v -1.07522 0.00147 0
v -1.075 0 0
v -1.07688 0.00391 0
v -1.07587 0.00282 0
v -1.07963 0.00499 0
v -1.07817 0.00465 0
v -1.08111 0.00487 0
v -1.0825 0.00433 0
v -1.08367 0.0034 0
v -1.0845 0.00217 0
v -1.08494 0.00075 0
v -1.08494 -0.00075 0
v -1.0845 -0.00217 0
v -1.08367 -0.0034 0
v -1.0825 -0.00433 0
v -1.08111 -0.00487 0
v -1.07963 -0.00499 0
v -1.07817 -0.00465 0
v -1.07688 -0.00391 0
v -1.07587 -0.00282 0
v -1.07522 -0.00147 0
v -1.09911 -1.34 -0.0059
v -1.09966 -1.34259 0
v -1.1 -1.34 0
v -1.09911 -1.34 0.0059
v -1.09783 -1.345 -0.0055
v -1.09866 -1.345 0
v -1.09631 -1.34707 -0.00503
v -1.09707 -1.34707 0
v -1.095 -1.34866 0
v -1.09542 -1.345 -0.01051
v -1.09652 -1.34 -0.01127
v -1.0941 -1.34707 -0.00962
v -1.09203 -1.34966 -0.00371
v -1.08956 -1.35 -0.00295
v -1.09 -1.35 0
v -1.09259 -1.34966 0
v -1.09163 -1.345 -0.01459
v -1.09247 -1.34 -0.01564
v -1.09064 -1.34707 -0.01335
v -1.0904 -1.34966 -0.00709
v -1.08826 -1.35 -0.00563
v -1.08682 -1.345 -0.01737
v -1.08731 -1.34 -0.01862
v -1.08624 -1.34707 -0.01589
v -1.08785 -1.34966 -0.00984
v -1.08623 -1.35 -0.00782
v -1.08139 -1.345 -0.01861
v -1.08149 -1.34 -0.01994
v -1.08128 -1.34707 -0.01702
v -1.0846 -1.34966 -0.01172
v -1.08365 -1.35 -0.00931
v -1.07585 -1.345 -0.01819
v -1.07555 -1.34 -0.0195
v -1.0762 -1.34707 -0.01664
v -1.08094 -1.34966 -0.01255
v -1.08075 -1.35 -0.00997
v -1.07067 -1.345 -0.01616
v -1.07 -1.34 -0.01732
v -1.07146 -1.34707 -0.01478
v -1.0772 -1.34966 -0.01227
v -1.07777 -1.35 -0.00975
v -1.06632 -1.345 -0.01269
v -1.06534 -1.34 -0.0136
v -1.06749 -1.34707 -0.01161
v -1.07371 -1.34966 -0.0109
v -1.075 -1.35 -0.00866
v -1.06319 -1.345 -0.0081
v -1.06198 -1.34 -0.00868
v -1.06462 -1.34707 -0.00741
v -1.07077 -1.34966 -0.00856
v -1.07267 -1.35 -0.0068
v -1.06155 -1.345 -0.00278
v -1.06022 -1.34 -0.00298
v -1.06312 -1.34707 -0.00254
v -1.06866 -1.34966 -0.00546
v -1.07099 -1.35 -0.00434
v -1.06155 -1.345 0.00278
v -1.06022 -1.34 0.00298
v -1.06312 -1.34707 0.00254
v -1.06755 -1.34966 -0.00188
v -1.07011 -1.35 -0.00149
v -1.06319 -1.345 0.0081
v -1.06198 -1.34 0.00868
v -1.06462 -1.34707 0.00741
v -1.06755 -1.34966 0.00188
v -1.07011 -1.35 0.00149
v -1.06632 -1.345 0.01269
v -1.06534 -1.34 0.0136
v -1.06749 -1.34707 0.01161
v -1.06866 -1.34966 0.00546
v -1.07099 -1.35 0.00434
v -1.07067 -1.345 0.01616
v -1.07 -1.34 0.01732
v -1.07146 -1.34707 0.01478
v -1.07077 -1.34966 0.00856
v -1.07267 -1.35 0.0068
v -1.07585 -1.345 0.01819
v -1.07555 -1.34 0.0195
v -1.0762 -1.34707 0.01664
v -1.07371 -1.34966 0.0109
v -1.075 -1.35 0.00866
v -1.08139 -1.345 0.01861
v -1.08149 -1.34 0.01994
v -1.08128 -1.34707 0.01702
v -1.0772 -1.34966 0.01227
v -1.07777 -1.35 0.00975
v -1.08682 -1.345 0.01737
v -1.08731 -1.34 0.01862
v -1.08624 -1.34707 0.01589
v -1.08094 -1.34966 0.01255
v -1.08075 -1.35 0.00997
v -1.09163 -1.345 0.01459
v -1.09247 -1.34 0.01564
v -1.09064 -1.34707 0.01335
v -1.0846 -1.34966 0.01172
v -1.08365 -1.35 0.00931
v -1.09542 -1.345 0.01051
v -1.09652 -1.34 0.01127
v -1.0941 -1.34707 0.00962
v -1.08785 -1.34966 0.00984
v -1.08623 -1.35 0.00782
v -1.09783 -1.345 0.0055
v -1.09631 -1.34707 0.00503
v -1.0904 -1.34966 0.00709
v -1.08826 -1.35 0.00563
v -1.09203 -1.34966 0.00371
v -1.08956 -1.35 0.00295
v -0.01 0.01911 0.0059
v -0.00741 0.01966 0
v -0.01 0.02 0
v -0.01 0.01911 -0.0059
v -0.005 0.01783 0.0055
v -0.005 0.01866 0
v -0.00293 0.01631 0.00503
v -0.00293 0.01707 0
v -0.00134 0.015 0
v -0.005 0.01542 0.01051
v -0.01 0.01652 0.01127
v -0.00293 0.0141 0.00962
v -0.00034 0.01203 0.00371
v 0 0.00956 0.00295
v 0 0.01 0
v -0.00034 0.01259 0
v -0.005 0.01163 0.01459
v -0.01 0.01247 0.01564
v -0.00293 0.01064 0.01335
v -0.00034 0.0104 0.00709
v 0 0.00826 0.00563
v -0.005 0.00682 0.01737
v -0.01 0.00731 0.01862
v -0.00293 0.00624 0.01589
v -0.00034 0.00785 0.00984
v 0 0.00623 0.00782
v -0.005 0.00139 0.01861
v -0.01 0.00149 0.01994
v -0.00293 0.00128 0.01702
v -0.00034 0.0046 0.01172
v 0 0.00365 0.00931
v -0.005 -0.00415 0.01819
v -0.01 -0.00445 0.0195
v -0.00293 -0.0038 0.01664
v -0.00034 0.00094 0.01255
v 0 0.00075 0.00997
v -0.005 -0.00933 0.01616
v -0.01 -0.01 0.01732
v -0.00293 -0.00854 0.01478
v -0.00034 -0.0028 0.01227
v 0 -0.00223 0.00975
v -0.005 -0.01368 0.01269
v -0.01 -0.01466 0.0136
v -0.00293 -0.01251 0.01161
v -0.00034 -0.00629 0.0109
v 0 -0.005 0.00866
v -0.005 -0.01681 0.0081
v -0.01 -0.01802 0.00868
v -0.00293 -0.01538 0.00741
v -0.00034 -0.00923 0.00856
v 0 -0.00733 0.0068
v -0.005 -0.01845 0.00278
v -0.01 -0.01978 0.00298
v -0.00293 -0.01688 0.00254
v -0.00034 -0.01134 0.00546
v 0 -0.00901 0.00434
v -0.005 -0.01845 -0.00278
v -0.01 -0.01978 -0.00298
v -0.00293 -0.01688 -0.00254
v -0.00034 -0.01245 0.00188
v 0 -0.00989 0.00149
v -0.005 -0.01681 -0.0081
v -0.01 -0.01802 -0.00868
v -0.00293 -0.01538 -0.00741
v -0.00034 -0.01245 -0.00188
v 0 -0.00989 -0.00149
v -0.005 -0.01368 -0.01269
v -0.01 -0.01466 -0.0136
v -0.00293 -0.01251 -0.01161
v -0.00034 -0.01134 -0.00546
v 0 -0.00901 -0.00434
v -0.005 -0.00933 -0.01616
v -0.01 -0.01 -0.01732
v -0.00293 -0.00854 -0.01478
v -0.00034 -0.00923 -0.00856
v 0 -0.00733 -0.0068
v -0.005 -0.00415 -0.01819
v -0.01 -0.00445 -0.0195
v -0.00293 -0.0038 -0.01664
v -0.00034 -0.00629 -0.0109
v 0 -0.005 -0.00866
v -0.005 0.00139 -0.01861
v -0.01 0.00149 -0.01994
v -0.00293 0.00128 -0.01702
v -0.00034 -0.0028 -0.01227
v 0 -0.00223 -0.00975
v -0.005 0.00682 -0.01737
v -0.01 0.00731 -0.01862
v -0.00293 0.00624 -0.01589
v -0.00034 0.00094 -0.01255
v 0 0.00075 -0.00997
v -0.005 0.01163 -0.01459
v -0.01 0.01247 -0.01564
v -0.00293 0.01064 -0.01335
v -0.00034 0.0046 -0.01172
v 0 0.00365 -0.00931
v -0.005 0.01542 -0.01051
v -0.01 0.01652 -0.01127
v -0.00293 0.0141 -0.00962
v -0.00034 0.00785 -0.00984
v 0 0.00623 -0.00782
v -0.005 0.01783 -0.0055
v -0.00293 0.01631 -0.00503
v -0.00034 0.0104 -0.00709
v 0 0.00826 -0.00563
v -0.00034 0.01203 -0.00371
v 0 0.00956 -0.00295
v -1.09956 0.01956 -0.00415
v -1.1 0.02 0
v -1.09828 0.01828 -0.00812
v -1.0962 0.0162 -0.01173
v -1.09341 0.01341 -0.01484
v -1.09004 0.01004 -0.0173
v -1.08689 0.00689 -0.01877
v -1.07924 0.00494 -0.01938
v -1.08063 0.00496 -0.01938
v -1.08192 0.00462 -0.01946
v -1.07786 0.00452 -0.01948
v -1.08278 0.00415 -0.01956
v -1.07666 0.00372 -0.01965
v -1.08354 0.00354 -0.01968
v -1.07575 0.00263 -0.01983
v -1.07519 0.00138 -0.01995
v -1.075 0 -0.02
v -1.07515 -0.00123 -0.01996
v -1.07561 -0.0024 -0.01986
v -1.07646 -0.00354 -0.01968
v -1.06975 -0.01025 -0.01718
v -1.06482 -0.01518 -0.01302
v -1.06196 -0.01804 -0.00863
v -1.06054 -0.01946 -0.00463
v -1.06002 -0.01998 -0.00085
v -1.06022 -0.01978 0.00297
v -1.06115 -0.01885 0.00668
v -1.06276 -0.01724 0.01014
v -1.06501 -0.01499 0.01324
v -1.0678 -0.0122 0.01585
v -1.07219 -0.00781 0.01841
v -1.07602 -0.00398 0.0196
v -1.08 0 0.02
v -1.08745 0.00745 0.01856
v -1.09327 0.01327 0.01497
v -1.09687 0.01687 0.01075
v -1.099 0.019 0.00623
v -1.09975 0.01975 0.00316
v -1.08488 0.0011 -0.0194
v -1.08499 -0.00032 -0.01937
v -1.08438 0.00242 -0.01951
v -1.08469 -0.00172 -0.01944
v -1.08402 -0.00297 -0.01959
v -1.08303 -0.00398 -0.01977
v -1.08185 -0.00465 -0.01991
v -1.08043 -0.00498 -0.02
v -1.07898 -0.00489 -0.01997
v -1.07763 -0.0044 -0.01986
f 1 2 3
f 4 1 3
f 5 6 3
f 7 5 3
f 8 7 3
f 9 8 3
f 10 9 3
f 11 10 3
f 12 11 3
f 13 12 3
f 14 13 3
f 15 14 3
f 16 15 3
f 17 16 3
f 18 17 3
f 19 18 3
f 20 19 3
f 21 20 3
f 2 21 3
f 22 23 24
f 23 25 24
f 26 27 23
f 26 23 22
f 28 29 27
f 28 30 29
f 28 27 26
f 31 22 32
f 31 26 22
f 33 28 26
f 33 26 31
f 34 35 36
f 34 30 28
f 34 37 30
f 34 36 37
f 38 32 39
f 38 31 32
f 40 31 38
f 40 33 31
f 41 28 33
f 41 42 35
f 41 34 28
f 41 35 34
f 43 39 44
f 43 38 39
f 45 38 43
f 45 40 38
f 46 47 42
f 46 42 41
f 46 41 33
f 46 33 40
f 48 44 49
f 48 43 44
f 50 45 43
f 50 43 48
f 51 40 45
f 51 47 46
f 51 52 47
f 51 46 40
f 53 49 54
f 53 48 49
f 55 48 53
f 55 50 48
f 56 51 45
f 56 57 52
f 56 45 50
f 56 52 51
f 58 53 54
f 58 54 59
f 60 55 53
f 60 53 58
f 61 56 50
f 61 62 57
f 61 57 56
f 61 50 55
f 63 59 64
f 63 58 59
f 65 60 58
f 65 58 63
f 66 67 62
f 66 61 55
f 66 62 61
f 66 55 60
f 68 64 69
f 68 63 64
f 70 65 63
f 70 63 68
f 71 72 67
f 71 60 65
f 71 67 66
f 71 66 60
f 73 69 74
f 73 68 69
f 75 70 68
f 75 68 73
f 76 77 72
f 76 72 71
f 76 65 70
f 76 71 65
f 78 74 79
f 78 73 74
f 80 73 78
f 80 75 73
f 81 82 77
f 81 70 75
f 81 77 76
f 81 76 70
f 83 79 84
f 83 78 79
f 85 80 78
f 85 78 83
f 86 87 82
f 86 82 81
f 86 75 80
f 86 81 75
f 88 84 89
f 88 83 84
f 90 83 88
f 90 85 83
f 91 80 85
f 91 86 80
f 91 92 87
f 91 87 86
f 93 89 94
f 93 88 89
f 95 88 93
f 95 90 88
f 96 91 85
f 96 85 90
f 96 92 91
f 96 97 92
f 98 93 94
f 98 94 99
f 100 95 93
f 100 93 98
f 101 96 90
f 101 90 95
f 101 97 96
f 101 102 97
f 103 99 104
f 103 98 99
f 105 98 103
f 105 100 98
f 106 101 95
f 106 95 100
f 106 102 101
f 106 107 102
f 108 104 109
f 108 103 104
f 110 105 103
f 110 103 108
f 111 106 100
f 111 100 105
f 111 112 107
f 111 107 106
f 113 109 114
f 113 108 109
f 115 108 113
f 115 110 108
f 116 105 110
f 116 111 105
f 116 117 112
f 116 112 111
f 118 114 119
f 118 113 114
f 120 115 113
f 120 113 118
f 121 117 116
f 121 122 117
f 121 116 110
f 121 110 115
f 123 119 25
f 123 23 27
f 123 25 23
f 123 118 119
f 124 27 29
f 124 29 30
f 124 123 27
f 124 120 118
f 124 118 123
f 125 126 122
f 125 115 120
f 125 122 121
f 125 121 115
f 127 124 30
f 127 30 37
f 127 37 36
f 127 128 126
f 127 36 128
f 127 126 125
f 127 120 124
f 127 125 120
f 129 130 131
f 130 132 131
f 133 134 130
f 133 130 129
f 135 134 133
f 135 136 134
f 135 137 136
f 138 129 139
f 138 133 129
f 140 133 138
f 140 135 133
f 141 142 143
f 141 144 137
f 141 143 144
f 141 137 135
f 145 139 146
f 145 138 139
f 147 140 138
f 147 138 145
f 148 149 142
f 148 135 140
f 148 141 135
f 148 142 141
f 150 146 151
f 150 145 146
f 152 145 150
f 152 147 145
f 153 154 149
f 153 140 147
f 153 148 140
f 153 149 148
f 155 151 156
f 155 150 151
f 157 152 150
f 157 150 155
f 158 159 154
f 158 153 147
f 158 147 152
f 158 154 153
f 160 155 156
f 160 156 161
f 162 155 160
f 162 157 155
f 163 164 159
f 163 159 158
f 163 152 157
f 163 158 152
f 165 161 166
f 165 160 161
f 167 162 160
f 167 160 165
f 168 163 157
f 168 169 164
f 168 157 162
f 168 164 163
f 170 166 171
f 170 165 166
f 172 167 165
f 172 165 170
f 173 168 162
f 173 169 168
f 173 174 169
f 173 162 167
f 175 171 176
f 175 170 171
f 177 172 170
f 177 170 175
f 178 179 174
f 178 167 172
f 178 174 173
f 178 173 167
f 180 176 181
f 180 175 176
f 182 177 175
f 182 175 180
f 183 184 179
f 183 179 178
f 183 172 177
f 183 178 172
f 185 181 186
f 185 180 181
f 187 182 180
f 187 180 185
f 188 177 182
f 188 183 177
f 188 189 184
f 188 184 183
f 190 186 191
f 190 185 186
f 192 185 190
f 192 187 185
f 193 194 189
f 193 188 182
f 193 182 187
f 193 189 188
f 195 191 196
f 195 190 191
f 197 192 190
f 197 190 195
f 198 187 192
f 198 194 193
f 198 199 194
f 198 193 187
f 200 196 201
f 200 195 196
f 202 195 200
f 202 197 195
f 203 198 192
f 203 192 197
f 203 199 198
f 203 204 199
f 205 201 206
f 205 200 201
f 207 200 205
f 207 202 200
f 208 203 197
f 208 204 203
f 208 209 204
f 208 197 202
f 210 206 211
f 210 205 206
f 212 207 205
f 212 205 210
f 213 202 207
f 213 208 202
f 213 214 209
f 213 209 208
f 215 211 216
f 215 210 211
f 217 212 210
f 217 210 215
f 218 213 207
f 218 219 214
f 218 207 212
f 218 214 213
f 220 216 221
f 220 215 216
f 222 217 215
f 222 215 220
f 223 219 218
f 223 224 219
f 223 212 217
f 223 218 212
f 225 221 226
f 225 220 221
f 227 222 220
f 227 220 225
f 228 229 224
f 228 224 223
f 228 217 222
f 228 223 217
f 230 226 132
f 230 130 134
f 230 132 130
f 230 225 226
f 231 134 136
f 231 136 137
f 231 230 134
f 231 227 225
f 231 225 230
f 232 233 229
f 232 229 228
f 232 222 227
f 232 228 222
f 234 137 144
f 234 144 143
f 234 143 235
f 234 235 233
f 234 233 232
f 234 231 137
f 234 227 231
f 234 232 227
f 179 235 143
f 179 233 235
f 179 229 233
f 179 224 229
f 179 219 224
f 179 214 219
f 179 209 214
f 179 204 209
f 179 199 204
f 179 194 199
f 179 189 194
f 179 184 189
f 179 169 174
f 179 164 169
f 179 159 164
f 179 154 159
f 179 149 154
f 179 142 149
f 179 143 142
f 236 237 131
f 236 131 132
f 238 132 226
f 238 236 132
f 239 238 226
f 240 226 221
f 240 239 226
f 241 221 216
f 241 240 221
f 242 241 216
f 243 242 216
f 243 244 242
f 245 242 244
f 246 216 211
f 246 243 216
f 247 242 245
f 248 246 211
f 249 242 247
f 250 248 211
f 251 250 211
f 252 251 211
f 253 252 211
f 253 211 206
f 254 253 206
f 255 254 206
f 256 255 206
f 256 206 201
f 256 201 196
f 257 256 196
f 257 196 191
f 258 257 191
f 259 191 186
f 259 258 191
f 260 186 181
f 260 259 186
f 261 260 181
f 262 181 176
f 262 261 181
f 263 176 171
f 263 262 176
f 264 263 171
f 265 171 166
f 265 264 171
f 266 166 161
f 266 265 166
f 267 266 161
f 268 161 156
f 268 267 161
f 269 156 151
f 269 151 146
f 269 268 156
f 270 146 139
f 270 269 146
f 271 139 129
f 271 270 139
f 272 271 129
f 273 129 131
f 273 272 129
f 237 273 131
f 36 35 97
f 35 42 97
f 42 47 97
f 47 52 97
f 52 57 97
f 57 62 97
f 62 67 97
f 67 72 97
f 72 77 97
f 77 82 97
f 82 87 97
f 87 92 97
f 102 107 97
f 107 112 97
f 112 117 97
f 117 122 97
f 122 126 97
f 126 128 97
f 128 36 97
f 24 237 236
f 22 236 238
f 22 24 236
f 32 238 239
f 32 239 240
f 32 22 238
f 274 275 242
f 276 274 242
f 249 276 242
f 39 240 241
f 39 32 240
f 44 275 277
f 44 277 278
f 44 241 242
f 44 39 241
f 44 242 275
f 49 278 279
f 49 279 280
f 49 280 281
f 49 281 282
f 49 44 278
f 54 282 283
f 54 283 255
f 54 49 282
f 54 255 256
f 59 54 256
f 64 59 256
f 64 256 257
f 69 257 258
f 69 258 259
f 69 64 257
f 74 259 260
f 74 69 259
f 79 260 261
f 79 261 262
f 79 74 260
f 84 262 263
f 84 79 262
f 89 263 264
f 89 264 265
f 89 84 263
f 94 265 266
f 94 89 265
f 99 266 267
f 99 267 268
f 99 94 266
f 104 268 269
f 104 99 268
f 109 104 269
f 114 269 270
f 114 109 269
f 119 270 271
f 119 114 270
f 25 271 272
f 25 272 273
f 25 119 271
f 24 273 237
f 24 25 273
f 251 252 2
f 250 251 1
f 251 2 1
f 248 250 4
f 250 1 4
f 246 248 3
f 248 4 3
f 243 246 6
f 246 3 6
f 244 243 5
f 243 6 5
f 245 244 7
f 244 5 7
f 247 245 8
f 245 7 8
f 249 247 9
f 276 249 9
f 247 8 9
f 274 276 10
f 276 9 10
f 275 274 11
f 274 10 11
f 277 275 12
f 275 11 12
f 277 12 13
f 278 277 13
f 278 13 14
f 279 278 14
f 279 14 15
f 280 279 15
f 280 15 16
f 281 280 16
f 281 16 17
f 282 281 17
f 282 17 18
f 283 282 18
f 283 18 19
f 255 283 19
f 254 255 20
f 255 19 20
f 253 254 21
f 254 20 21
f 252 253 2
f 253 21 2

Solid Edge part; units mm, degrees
sketch "Sketch1" plane through (0, 0, 0) normal (0, 0, 1) x (1, 0, 0)
  line L0 (0, 0) -> (-1.08, 0)
  line L1 (-1.08, 0) -> (-1.08, -1.35)
  dimension "D1" = 1.08
  dimension "D2" = 1.35
sketch "Sketch2" plane through (0, 0, 0) normal (1, 0, 0) x (0, 1, 0)
  circle A0 centre (0, 0) radius 0.02
  dimension "D1" = 0.04
sweep "SweptProtrusion1" add profiles "Sketch2" path "Sketch1"
fillet "Round1" radius 0.01 2 edges at (-1.06, -1.35, 0) (0, -0.02, 0)
sketch "Sketch3" plane through (0, 0, 0) normal (0, 0, 1) x (1, 0, 0)
  circle A0 centre (-1.08, 0) radius 0.005
  dimension "D1" = 0.01
extrude "Cutout1" cut sketch "Sketch3" against normal through all
